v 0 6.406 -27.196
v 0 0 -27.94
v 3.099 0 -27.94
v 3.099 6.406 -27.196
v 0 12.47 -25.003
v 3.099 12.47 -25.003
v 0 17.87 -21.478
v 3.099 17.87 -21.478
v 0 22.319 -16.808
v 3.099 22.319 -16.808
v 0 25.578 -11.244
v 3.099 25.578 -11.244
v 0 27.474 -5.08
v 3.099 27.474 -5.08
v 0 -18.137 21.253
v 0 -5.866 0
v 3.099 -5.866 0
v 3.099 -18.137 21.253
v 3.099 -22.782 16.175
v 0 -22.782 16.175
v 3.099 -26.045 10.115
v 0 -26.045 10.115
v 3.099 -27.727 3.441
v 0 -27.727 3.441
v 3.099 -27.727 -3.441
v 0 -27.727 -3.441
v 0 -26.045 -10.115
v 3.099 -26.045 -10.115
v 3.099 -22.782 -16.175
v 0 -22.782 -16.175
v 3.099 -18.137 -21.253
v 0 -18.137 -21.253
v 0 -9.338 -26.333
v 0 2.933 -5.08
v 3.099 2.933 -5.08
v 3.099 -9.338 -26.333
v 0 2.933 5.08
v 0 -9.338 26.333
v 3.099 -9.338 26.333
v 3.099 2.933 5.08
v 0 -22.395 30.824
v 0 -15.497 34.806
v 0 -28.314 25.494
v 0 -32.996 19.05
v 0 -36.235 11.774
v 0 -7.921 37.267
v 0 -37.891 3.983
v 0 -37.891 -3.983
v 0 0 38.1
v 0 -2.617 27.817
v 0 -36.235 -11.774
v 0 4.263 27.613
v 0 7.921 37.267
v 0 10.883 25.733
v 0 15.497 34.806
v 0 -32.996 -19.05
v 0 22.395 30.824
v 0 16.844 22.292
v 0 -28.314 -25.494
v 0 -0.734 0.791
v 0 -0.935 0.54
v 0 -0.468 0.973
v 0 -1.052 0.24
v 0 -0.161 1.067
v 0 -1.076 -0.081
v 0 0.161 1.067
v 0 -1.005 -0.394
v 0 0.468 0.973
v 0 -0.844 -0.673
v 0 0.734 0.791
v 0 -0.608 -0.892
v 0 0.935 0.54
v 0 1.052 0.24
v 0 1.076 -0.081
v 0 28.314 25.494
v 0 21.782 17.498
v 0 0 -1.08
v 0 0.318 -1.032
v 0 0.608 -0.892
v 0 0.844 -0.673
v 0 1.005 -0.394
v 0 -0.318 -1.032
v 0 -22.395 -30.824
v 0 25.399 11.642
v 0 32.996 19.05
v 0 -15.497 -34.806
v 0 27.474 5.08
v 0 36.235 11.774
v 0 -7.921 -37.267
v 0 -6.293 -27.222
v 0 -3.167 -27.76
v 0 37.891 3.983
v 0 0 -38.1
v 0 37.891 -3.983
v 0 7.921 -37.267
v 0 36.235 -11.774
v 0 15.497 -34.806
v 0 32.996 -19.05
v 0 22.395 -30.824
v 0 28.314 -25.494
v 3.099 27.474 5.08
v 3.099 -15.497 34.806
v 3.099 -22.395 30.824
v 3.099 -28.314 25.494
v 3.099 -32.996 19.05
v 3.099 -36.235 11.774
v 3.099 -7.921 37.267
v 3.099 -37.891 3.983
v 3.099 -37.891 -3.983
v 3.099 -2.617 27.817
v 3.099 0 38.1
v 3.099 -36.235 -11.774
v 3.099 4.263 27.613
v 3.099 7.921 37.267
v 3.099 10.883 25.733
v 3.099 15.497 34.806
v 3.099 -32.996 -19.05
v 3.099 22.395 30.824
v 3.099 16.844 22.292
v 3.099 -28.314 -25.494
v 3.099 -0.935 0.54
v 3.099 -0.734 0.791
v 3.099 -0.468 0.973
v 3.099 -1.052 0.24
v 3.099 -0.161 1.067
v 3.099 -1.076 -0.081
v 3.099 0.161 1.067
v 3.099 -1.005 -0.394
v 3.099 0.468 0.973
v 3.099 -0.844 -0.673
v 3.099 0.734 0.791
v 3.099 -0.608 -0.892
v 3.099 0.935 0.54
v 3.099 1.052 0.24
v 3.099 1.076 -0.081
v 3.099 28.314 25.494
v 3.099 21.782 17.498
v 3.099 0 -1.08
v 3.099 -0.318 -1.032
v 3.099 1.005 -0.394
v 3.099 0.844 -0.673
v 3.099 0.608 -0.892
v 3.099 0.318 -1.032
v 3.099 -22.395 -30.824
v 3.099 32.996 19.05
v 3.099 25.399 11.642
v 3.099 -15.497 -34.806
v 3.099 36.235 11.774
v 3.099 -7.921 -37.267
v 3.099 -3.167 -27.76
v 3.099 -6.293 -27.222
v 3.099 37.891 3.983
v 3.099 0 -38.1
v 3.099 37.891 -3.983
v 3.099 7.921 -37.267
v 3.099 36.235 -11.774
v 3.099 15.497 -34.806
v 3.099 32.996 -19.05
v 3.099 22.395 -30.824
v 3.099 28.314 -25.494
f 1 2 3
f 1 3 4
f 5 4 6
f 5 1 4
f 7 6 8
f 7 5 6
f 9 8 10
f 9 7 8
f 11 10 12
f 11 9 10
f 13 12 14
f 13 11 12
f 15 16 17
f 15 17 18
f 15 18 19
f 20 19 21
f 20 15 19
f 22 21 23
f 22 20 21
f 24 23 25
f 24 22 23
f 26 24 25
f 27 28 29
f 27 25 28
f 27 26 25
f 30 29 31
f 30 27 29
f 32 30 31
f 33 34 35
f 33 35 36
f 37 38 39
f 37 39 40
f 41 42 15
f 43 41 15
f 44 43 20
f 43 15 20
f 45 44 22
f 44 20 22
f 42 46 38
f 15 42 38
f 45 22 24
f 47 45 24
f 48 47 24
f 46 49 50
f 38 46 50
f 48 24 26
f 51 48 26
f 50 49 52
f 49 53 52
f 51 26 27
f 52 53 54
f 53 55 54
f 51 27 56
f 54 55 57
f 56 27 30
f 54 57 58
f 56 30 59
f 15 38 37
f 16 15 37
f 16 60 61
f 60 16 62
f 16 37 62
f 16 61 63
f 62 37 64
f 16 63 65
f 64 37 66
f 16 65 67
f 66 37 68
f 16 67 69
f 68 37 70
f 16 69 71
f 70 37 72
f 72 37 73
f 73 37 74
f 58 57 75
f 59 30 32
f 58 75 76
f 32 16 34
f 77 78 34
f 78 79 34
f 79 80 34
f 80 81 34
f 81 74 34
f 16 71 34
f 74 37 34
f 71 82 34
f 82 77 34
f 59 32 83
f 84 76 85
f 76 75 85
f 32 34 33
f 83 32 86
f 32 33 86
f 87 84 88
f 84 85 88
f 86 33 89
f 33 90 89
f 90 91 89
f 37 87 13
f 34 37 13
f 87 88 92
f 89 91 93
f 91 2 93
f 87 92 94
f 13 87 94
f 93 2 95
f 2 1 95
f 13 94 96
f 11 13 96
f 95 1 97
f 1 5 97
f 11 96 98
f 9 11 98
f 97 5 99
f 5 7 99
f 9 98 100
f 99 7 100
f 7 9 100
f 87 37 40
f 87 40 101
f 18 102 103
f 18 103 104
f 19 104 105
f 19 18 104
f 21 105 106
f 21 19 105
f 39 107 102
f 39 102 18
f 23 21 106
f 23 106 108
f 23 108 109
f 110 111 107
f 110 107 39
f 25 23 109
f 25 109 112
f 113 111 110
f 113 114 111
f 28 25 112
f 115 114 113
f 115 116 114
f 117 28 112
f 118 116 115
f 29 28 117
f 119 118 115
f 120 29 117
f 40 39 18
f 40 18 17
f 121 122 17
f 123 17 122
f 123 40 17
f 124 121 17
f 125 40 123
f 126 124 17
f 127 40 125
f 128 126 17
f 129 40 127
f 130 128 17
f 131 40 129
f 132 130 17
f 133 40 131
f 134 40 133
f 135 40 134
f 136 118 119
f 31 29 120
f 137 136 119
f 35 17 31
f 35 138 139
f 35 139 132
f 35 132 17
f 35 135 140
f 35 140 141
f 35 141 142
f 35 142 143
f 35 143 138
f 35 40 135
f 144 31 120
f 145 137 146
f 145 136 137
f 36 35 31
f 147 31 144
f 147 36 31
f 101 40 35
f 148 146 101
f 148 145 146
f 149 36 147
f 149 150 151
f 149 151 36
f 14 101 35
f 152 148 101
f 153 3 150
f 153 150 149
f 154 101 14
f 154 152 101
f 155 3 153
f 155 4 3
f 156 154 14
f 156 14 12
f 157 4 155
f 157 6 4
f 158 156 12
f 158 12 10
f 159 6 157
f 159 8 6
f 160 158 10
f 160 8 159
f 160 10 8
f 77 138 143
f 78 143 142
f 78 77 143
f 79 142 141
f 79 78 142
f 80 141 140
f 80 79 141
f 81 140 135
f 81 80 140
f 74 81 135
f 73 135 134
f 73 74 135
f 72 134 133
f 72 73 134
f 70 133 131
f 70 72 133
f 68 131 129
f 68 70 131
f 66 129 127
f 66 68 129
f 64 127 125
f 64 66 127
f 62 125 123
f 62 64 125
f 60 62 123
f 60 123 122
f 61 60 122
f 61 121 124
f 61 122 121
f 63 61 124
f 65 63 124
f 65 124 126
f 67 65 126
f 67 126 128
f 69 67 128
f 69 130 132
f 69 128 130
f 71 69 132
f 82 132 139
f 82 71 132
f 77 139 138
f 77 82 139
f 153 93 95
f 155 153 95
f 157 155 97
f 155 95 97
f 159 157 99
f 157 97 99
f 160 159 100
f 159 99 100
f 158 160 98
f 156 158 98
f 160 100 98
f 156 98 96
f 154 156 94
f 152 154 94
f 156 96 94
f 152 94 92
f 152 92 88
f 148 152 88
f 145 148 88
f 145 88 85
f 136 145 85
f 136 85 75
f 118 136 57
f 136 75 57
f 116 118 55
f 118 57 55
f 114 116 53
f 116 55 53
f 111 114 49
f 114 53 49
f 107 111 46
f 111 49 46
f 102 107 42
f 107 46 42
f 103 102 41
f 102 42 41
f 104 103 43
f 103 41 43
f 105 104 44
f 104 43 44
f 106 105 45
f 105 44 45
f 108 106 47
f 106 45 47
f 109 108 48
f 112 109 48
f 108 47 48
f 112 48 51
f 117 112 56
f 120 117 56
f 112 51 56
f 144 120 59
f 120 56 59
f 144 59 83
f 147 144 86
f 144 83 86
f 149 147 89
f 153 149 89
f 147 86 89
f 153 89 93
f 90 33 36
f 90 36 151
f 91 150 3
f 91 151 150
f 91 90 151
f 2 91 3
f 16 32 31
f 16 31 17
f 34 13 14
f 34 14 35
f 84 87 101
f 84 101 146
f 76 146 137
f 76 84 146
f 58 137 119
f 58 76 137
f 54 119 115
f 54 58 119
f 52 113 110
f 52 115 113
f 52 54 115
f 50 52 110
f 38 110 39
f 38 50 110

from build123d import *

# Parameters (mm, degrees)
SKETCH2_R           = 38.1
BOSS_EXTRUDE5_DEPTH = 3.0988
SKETCH2_3_R         = 1.0795
CUT_EXTRUDE3_DEPTH  = 54.970571254


with BuildPart() as part:
    # Sketch2 → Boss-Extrude5 (new body)
    with BuildSketch(Plane(origin=(0, 0, 0), x_dir=(0, 0, -1), z_dir=(1, 0, 0))):
        Circle(SKETCH2_R)
    extrude(amount=BOSS_EXTRUDE5_DEPTH)

    # Sketch2<3> → Cut-Extrude3 (cut, through all)
    with BuildSketch(Plane(origin=(0, 0, 0), x_dir=(0, 0, -1), z_dir=(1, 0, 0))):
        with BuildLine():
            Line((21.253442374, -18.136559411), (0, -5.865878735))
            Line((0, -5.865878735), (-21.253442374, -18.136559411))
            ThreePointArc((-21.253442374, -18.136559411), (0, -27.94), (21.253442374, -18.136559411))
        make_face()
        with BuildLine():
            Line((-26.333442374, -9.337741308), (-5.08, 2.932939367))
            Line((-5.08, 2.932939367), (-5.08, 27.474300719))
            ThreePointArc((-5.08, 27.474300719), (-24.196749782, 13.97), (-26.333442374, -9.337741308))
        make_face()
        with BuildLine():
            Line((5.08, 2.932939367), (26.333442374, -9.337741308))
            ThreePointArc((26.333442374, -9.337741308), (24.196749782, 13.97), (5.08, 27.474300719))
            Line((5.08, 27.474300719), (5.08, 2.932939367))
        make_face()
        Circle(SKETCH2_3_R)
    extrude(amount=CUT_EXTRUDE3_DEPTH, mode=Mode.SUBTRACT)


solid = part.part
